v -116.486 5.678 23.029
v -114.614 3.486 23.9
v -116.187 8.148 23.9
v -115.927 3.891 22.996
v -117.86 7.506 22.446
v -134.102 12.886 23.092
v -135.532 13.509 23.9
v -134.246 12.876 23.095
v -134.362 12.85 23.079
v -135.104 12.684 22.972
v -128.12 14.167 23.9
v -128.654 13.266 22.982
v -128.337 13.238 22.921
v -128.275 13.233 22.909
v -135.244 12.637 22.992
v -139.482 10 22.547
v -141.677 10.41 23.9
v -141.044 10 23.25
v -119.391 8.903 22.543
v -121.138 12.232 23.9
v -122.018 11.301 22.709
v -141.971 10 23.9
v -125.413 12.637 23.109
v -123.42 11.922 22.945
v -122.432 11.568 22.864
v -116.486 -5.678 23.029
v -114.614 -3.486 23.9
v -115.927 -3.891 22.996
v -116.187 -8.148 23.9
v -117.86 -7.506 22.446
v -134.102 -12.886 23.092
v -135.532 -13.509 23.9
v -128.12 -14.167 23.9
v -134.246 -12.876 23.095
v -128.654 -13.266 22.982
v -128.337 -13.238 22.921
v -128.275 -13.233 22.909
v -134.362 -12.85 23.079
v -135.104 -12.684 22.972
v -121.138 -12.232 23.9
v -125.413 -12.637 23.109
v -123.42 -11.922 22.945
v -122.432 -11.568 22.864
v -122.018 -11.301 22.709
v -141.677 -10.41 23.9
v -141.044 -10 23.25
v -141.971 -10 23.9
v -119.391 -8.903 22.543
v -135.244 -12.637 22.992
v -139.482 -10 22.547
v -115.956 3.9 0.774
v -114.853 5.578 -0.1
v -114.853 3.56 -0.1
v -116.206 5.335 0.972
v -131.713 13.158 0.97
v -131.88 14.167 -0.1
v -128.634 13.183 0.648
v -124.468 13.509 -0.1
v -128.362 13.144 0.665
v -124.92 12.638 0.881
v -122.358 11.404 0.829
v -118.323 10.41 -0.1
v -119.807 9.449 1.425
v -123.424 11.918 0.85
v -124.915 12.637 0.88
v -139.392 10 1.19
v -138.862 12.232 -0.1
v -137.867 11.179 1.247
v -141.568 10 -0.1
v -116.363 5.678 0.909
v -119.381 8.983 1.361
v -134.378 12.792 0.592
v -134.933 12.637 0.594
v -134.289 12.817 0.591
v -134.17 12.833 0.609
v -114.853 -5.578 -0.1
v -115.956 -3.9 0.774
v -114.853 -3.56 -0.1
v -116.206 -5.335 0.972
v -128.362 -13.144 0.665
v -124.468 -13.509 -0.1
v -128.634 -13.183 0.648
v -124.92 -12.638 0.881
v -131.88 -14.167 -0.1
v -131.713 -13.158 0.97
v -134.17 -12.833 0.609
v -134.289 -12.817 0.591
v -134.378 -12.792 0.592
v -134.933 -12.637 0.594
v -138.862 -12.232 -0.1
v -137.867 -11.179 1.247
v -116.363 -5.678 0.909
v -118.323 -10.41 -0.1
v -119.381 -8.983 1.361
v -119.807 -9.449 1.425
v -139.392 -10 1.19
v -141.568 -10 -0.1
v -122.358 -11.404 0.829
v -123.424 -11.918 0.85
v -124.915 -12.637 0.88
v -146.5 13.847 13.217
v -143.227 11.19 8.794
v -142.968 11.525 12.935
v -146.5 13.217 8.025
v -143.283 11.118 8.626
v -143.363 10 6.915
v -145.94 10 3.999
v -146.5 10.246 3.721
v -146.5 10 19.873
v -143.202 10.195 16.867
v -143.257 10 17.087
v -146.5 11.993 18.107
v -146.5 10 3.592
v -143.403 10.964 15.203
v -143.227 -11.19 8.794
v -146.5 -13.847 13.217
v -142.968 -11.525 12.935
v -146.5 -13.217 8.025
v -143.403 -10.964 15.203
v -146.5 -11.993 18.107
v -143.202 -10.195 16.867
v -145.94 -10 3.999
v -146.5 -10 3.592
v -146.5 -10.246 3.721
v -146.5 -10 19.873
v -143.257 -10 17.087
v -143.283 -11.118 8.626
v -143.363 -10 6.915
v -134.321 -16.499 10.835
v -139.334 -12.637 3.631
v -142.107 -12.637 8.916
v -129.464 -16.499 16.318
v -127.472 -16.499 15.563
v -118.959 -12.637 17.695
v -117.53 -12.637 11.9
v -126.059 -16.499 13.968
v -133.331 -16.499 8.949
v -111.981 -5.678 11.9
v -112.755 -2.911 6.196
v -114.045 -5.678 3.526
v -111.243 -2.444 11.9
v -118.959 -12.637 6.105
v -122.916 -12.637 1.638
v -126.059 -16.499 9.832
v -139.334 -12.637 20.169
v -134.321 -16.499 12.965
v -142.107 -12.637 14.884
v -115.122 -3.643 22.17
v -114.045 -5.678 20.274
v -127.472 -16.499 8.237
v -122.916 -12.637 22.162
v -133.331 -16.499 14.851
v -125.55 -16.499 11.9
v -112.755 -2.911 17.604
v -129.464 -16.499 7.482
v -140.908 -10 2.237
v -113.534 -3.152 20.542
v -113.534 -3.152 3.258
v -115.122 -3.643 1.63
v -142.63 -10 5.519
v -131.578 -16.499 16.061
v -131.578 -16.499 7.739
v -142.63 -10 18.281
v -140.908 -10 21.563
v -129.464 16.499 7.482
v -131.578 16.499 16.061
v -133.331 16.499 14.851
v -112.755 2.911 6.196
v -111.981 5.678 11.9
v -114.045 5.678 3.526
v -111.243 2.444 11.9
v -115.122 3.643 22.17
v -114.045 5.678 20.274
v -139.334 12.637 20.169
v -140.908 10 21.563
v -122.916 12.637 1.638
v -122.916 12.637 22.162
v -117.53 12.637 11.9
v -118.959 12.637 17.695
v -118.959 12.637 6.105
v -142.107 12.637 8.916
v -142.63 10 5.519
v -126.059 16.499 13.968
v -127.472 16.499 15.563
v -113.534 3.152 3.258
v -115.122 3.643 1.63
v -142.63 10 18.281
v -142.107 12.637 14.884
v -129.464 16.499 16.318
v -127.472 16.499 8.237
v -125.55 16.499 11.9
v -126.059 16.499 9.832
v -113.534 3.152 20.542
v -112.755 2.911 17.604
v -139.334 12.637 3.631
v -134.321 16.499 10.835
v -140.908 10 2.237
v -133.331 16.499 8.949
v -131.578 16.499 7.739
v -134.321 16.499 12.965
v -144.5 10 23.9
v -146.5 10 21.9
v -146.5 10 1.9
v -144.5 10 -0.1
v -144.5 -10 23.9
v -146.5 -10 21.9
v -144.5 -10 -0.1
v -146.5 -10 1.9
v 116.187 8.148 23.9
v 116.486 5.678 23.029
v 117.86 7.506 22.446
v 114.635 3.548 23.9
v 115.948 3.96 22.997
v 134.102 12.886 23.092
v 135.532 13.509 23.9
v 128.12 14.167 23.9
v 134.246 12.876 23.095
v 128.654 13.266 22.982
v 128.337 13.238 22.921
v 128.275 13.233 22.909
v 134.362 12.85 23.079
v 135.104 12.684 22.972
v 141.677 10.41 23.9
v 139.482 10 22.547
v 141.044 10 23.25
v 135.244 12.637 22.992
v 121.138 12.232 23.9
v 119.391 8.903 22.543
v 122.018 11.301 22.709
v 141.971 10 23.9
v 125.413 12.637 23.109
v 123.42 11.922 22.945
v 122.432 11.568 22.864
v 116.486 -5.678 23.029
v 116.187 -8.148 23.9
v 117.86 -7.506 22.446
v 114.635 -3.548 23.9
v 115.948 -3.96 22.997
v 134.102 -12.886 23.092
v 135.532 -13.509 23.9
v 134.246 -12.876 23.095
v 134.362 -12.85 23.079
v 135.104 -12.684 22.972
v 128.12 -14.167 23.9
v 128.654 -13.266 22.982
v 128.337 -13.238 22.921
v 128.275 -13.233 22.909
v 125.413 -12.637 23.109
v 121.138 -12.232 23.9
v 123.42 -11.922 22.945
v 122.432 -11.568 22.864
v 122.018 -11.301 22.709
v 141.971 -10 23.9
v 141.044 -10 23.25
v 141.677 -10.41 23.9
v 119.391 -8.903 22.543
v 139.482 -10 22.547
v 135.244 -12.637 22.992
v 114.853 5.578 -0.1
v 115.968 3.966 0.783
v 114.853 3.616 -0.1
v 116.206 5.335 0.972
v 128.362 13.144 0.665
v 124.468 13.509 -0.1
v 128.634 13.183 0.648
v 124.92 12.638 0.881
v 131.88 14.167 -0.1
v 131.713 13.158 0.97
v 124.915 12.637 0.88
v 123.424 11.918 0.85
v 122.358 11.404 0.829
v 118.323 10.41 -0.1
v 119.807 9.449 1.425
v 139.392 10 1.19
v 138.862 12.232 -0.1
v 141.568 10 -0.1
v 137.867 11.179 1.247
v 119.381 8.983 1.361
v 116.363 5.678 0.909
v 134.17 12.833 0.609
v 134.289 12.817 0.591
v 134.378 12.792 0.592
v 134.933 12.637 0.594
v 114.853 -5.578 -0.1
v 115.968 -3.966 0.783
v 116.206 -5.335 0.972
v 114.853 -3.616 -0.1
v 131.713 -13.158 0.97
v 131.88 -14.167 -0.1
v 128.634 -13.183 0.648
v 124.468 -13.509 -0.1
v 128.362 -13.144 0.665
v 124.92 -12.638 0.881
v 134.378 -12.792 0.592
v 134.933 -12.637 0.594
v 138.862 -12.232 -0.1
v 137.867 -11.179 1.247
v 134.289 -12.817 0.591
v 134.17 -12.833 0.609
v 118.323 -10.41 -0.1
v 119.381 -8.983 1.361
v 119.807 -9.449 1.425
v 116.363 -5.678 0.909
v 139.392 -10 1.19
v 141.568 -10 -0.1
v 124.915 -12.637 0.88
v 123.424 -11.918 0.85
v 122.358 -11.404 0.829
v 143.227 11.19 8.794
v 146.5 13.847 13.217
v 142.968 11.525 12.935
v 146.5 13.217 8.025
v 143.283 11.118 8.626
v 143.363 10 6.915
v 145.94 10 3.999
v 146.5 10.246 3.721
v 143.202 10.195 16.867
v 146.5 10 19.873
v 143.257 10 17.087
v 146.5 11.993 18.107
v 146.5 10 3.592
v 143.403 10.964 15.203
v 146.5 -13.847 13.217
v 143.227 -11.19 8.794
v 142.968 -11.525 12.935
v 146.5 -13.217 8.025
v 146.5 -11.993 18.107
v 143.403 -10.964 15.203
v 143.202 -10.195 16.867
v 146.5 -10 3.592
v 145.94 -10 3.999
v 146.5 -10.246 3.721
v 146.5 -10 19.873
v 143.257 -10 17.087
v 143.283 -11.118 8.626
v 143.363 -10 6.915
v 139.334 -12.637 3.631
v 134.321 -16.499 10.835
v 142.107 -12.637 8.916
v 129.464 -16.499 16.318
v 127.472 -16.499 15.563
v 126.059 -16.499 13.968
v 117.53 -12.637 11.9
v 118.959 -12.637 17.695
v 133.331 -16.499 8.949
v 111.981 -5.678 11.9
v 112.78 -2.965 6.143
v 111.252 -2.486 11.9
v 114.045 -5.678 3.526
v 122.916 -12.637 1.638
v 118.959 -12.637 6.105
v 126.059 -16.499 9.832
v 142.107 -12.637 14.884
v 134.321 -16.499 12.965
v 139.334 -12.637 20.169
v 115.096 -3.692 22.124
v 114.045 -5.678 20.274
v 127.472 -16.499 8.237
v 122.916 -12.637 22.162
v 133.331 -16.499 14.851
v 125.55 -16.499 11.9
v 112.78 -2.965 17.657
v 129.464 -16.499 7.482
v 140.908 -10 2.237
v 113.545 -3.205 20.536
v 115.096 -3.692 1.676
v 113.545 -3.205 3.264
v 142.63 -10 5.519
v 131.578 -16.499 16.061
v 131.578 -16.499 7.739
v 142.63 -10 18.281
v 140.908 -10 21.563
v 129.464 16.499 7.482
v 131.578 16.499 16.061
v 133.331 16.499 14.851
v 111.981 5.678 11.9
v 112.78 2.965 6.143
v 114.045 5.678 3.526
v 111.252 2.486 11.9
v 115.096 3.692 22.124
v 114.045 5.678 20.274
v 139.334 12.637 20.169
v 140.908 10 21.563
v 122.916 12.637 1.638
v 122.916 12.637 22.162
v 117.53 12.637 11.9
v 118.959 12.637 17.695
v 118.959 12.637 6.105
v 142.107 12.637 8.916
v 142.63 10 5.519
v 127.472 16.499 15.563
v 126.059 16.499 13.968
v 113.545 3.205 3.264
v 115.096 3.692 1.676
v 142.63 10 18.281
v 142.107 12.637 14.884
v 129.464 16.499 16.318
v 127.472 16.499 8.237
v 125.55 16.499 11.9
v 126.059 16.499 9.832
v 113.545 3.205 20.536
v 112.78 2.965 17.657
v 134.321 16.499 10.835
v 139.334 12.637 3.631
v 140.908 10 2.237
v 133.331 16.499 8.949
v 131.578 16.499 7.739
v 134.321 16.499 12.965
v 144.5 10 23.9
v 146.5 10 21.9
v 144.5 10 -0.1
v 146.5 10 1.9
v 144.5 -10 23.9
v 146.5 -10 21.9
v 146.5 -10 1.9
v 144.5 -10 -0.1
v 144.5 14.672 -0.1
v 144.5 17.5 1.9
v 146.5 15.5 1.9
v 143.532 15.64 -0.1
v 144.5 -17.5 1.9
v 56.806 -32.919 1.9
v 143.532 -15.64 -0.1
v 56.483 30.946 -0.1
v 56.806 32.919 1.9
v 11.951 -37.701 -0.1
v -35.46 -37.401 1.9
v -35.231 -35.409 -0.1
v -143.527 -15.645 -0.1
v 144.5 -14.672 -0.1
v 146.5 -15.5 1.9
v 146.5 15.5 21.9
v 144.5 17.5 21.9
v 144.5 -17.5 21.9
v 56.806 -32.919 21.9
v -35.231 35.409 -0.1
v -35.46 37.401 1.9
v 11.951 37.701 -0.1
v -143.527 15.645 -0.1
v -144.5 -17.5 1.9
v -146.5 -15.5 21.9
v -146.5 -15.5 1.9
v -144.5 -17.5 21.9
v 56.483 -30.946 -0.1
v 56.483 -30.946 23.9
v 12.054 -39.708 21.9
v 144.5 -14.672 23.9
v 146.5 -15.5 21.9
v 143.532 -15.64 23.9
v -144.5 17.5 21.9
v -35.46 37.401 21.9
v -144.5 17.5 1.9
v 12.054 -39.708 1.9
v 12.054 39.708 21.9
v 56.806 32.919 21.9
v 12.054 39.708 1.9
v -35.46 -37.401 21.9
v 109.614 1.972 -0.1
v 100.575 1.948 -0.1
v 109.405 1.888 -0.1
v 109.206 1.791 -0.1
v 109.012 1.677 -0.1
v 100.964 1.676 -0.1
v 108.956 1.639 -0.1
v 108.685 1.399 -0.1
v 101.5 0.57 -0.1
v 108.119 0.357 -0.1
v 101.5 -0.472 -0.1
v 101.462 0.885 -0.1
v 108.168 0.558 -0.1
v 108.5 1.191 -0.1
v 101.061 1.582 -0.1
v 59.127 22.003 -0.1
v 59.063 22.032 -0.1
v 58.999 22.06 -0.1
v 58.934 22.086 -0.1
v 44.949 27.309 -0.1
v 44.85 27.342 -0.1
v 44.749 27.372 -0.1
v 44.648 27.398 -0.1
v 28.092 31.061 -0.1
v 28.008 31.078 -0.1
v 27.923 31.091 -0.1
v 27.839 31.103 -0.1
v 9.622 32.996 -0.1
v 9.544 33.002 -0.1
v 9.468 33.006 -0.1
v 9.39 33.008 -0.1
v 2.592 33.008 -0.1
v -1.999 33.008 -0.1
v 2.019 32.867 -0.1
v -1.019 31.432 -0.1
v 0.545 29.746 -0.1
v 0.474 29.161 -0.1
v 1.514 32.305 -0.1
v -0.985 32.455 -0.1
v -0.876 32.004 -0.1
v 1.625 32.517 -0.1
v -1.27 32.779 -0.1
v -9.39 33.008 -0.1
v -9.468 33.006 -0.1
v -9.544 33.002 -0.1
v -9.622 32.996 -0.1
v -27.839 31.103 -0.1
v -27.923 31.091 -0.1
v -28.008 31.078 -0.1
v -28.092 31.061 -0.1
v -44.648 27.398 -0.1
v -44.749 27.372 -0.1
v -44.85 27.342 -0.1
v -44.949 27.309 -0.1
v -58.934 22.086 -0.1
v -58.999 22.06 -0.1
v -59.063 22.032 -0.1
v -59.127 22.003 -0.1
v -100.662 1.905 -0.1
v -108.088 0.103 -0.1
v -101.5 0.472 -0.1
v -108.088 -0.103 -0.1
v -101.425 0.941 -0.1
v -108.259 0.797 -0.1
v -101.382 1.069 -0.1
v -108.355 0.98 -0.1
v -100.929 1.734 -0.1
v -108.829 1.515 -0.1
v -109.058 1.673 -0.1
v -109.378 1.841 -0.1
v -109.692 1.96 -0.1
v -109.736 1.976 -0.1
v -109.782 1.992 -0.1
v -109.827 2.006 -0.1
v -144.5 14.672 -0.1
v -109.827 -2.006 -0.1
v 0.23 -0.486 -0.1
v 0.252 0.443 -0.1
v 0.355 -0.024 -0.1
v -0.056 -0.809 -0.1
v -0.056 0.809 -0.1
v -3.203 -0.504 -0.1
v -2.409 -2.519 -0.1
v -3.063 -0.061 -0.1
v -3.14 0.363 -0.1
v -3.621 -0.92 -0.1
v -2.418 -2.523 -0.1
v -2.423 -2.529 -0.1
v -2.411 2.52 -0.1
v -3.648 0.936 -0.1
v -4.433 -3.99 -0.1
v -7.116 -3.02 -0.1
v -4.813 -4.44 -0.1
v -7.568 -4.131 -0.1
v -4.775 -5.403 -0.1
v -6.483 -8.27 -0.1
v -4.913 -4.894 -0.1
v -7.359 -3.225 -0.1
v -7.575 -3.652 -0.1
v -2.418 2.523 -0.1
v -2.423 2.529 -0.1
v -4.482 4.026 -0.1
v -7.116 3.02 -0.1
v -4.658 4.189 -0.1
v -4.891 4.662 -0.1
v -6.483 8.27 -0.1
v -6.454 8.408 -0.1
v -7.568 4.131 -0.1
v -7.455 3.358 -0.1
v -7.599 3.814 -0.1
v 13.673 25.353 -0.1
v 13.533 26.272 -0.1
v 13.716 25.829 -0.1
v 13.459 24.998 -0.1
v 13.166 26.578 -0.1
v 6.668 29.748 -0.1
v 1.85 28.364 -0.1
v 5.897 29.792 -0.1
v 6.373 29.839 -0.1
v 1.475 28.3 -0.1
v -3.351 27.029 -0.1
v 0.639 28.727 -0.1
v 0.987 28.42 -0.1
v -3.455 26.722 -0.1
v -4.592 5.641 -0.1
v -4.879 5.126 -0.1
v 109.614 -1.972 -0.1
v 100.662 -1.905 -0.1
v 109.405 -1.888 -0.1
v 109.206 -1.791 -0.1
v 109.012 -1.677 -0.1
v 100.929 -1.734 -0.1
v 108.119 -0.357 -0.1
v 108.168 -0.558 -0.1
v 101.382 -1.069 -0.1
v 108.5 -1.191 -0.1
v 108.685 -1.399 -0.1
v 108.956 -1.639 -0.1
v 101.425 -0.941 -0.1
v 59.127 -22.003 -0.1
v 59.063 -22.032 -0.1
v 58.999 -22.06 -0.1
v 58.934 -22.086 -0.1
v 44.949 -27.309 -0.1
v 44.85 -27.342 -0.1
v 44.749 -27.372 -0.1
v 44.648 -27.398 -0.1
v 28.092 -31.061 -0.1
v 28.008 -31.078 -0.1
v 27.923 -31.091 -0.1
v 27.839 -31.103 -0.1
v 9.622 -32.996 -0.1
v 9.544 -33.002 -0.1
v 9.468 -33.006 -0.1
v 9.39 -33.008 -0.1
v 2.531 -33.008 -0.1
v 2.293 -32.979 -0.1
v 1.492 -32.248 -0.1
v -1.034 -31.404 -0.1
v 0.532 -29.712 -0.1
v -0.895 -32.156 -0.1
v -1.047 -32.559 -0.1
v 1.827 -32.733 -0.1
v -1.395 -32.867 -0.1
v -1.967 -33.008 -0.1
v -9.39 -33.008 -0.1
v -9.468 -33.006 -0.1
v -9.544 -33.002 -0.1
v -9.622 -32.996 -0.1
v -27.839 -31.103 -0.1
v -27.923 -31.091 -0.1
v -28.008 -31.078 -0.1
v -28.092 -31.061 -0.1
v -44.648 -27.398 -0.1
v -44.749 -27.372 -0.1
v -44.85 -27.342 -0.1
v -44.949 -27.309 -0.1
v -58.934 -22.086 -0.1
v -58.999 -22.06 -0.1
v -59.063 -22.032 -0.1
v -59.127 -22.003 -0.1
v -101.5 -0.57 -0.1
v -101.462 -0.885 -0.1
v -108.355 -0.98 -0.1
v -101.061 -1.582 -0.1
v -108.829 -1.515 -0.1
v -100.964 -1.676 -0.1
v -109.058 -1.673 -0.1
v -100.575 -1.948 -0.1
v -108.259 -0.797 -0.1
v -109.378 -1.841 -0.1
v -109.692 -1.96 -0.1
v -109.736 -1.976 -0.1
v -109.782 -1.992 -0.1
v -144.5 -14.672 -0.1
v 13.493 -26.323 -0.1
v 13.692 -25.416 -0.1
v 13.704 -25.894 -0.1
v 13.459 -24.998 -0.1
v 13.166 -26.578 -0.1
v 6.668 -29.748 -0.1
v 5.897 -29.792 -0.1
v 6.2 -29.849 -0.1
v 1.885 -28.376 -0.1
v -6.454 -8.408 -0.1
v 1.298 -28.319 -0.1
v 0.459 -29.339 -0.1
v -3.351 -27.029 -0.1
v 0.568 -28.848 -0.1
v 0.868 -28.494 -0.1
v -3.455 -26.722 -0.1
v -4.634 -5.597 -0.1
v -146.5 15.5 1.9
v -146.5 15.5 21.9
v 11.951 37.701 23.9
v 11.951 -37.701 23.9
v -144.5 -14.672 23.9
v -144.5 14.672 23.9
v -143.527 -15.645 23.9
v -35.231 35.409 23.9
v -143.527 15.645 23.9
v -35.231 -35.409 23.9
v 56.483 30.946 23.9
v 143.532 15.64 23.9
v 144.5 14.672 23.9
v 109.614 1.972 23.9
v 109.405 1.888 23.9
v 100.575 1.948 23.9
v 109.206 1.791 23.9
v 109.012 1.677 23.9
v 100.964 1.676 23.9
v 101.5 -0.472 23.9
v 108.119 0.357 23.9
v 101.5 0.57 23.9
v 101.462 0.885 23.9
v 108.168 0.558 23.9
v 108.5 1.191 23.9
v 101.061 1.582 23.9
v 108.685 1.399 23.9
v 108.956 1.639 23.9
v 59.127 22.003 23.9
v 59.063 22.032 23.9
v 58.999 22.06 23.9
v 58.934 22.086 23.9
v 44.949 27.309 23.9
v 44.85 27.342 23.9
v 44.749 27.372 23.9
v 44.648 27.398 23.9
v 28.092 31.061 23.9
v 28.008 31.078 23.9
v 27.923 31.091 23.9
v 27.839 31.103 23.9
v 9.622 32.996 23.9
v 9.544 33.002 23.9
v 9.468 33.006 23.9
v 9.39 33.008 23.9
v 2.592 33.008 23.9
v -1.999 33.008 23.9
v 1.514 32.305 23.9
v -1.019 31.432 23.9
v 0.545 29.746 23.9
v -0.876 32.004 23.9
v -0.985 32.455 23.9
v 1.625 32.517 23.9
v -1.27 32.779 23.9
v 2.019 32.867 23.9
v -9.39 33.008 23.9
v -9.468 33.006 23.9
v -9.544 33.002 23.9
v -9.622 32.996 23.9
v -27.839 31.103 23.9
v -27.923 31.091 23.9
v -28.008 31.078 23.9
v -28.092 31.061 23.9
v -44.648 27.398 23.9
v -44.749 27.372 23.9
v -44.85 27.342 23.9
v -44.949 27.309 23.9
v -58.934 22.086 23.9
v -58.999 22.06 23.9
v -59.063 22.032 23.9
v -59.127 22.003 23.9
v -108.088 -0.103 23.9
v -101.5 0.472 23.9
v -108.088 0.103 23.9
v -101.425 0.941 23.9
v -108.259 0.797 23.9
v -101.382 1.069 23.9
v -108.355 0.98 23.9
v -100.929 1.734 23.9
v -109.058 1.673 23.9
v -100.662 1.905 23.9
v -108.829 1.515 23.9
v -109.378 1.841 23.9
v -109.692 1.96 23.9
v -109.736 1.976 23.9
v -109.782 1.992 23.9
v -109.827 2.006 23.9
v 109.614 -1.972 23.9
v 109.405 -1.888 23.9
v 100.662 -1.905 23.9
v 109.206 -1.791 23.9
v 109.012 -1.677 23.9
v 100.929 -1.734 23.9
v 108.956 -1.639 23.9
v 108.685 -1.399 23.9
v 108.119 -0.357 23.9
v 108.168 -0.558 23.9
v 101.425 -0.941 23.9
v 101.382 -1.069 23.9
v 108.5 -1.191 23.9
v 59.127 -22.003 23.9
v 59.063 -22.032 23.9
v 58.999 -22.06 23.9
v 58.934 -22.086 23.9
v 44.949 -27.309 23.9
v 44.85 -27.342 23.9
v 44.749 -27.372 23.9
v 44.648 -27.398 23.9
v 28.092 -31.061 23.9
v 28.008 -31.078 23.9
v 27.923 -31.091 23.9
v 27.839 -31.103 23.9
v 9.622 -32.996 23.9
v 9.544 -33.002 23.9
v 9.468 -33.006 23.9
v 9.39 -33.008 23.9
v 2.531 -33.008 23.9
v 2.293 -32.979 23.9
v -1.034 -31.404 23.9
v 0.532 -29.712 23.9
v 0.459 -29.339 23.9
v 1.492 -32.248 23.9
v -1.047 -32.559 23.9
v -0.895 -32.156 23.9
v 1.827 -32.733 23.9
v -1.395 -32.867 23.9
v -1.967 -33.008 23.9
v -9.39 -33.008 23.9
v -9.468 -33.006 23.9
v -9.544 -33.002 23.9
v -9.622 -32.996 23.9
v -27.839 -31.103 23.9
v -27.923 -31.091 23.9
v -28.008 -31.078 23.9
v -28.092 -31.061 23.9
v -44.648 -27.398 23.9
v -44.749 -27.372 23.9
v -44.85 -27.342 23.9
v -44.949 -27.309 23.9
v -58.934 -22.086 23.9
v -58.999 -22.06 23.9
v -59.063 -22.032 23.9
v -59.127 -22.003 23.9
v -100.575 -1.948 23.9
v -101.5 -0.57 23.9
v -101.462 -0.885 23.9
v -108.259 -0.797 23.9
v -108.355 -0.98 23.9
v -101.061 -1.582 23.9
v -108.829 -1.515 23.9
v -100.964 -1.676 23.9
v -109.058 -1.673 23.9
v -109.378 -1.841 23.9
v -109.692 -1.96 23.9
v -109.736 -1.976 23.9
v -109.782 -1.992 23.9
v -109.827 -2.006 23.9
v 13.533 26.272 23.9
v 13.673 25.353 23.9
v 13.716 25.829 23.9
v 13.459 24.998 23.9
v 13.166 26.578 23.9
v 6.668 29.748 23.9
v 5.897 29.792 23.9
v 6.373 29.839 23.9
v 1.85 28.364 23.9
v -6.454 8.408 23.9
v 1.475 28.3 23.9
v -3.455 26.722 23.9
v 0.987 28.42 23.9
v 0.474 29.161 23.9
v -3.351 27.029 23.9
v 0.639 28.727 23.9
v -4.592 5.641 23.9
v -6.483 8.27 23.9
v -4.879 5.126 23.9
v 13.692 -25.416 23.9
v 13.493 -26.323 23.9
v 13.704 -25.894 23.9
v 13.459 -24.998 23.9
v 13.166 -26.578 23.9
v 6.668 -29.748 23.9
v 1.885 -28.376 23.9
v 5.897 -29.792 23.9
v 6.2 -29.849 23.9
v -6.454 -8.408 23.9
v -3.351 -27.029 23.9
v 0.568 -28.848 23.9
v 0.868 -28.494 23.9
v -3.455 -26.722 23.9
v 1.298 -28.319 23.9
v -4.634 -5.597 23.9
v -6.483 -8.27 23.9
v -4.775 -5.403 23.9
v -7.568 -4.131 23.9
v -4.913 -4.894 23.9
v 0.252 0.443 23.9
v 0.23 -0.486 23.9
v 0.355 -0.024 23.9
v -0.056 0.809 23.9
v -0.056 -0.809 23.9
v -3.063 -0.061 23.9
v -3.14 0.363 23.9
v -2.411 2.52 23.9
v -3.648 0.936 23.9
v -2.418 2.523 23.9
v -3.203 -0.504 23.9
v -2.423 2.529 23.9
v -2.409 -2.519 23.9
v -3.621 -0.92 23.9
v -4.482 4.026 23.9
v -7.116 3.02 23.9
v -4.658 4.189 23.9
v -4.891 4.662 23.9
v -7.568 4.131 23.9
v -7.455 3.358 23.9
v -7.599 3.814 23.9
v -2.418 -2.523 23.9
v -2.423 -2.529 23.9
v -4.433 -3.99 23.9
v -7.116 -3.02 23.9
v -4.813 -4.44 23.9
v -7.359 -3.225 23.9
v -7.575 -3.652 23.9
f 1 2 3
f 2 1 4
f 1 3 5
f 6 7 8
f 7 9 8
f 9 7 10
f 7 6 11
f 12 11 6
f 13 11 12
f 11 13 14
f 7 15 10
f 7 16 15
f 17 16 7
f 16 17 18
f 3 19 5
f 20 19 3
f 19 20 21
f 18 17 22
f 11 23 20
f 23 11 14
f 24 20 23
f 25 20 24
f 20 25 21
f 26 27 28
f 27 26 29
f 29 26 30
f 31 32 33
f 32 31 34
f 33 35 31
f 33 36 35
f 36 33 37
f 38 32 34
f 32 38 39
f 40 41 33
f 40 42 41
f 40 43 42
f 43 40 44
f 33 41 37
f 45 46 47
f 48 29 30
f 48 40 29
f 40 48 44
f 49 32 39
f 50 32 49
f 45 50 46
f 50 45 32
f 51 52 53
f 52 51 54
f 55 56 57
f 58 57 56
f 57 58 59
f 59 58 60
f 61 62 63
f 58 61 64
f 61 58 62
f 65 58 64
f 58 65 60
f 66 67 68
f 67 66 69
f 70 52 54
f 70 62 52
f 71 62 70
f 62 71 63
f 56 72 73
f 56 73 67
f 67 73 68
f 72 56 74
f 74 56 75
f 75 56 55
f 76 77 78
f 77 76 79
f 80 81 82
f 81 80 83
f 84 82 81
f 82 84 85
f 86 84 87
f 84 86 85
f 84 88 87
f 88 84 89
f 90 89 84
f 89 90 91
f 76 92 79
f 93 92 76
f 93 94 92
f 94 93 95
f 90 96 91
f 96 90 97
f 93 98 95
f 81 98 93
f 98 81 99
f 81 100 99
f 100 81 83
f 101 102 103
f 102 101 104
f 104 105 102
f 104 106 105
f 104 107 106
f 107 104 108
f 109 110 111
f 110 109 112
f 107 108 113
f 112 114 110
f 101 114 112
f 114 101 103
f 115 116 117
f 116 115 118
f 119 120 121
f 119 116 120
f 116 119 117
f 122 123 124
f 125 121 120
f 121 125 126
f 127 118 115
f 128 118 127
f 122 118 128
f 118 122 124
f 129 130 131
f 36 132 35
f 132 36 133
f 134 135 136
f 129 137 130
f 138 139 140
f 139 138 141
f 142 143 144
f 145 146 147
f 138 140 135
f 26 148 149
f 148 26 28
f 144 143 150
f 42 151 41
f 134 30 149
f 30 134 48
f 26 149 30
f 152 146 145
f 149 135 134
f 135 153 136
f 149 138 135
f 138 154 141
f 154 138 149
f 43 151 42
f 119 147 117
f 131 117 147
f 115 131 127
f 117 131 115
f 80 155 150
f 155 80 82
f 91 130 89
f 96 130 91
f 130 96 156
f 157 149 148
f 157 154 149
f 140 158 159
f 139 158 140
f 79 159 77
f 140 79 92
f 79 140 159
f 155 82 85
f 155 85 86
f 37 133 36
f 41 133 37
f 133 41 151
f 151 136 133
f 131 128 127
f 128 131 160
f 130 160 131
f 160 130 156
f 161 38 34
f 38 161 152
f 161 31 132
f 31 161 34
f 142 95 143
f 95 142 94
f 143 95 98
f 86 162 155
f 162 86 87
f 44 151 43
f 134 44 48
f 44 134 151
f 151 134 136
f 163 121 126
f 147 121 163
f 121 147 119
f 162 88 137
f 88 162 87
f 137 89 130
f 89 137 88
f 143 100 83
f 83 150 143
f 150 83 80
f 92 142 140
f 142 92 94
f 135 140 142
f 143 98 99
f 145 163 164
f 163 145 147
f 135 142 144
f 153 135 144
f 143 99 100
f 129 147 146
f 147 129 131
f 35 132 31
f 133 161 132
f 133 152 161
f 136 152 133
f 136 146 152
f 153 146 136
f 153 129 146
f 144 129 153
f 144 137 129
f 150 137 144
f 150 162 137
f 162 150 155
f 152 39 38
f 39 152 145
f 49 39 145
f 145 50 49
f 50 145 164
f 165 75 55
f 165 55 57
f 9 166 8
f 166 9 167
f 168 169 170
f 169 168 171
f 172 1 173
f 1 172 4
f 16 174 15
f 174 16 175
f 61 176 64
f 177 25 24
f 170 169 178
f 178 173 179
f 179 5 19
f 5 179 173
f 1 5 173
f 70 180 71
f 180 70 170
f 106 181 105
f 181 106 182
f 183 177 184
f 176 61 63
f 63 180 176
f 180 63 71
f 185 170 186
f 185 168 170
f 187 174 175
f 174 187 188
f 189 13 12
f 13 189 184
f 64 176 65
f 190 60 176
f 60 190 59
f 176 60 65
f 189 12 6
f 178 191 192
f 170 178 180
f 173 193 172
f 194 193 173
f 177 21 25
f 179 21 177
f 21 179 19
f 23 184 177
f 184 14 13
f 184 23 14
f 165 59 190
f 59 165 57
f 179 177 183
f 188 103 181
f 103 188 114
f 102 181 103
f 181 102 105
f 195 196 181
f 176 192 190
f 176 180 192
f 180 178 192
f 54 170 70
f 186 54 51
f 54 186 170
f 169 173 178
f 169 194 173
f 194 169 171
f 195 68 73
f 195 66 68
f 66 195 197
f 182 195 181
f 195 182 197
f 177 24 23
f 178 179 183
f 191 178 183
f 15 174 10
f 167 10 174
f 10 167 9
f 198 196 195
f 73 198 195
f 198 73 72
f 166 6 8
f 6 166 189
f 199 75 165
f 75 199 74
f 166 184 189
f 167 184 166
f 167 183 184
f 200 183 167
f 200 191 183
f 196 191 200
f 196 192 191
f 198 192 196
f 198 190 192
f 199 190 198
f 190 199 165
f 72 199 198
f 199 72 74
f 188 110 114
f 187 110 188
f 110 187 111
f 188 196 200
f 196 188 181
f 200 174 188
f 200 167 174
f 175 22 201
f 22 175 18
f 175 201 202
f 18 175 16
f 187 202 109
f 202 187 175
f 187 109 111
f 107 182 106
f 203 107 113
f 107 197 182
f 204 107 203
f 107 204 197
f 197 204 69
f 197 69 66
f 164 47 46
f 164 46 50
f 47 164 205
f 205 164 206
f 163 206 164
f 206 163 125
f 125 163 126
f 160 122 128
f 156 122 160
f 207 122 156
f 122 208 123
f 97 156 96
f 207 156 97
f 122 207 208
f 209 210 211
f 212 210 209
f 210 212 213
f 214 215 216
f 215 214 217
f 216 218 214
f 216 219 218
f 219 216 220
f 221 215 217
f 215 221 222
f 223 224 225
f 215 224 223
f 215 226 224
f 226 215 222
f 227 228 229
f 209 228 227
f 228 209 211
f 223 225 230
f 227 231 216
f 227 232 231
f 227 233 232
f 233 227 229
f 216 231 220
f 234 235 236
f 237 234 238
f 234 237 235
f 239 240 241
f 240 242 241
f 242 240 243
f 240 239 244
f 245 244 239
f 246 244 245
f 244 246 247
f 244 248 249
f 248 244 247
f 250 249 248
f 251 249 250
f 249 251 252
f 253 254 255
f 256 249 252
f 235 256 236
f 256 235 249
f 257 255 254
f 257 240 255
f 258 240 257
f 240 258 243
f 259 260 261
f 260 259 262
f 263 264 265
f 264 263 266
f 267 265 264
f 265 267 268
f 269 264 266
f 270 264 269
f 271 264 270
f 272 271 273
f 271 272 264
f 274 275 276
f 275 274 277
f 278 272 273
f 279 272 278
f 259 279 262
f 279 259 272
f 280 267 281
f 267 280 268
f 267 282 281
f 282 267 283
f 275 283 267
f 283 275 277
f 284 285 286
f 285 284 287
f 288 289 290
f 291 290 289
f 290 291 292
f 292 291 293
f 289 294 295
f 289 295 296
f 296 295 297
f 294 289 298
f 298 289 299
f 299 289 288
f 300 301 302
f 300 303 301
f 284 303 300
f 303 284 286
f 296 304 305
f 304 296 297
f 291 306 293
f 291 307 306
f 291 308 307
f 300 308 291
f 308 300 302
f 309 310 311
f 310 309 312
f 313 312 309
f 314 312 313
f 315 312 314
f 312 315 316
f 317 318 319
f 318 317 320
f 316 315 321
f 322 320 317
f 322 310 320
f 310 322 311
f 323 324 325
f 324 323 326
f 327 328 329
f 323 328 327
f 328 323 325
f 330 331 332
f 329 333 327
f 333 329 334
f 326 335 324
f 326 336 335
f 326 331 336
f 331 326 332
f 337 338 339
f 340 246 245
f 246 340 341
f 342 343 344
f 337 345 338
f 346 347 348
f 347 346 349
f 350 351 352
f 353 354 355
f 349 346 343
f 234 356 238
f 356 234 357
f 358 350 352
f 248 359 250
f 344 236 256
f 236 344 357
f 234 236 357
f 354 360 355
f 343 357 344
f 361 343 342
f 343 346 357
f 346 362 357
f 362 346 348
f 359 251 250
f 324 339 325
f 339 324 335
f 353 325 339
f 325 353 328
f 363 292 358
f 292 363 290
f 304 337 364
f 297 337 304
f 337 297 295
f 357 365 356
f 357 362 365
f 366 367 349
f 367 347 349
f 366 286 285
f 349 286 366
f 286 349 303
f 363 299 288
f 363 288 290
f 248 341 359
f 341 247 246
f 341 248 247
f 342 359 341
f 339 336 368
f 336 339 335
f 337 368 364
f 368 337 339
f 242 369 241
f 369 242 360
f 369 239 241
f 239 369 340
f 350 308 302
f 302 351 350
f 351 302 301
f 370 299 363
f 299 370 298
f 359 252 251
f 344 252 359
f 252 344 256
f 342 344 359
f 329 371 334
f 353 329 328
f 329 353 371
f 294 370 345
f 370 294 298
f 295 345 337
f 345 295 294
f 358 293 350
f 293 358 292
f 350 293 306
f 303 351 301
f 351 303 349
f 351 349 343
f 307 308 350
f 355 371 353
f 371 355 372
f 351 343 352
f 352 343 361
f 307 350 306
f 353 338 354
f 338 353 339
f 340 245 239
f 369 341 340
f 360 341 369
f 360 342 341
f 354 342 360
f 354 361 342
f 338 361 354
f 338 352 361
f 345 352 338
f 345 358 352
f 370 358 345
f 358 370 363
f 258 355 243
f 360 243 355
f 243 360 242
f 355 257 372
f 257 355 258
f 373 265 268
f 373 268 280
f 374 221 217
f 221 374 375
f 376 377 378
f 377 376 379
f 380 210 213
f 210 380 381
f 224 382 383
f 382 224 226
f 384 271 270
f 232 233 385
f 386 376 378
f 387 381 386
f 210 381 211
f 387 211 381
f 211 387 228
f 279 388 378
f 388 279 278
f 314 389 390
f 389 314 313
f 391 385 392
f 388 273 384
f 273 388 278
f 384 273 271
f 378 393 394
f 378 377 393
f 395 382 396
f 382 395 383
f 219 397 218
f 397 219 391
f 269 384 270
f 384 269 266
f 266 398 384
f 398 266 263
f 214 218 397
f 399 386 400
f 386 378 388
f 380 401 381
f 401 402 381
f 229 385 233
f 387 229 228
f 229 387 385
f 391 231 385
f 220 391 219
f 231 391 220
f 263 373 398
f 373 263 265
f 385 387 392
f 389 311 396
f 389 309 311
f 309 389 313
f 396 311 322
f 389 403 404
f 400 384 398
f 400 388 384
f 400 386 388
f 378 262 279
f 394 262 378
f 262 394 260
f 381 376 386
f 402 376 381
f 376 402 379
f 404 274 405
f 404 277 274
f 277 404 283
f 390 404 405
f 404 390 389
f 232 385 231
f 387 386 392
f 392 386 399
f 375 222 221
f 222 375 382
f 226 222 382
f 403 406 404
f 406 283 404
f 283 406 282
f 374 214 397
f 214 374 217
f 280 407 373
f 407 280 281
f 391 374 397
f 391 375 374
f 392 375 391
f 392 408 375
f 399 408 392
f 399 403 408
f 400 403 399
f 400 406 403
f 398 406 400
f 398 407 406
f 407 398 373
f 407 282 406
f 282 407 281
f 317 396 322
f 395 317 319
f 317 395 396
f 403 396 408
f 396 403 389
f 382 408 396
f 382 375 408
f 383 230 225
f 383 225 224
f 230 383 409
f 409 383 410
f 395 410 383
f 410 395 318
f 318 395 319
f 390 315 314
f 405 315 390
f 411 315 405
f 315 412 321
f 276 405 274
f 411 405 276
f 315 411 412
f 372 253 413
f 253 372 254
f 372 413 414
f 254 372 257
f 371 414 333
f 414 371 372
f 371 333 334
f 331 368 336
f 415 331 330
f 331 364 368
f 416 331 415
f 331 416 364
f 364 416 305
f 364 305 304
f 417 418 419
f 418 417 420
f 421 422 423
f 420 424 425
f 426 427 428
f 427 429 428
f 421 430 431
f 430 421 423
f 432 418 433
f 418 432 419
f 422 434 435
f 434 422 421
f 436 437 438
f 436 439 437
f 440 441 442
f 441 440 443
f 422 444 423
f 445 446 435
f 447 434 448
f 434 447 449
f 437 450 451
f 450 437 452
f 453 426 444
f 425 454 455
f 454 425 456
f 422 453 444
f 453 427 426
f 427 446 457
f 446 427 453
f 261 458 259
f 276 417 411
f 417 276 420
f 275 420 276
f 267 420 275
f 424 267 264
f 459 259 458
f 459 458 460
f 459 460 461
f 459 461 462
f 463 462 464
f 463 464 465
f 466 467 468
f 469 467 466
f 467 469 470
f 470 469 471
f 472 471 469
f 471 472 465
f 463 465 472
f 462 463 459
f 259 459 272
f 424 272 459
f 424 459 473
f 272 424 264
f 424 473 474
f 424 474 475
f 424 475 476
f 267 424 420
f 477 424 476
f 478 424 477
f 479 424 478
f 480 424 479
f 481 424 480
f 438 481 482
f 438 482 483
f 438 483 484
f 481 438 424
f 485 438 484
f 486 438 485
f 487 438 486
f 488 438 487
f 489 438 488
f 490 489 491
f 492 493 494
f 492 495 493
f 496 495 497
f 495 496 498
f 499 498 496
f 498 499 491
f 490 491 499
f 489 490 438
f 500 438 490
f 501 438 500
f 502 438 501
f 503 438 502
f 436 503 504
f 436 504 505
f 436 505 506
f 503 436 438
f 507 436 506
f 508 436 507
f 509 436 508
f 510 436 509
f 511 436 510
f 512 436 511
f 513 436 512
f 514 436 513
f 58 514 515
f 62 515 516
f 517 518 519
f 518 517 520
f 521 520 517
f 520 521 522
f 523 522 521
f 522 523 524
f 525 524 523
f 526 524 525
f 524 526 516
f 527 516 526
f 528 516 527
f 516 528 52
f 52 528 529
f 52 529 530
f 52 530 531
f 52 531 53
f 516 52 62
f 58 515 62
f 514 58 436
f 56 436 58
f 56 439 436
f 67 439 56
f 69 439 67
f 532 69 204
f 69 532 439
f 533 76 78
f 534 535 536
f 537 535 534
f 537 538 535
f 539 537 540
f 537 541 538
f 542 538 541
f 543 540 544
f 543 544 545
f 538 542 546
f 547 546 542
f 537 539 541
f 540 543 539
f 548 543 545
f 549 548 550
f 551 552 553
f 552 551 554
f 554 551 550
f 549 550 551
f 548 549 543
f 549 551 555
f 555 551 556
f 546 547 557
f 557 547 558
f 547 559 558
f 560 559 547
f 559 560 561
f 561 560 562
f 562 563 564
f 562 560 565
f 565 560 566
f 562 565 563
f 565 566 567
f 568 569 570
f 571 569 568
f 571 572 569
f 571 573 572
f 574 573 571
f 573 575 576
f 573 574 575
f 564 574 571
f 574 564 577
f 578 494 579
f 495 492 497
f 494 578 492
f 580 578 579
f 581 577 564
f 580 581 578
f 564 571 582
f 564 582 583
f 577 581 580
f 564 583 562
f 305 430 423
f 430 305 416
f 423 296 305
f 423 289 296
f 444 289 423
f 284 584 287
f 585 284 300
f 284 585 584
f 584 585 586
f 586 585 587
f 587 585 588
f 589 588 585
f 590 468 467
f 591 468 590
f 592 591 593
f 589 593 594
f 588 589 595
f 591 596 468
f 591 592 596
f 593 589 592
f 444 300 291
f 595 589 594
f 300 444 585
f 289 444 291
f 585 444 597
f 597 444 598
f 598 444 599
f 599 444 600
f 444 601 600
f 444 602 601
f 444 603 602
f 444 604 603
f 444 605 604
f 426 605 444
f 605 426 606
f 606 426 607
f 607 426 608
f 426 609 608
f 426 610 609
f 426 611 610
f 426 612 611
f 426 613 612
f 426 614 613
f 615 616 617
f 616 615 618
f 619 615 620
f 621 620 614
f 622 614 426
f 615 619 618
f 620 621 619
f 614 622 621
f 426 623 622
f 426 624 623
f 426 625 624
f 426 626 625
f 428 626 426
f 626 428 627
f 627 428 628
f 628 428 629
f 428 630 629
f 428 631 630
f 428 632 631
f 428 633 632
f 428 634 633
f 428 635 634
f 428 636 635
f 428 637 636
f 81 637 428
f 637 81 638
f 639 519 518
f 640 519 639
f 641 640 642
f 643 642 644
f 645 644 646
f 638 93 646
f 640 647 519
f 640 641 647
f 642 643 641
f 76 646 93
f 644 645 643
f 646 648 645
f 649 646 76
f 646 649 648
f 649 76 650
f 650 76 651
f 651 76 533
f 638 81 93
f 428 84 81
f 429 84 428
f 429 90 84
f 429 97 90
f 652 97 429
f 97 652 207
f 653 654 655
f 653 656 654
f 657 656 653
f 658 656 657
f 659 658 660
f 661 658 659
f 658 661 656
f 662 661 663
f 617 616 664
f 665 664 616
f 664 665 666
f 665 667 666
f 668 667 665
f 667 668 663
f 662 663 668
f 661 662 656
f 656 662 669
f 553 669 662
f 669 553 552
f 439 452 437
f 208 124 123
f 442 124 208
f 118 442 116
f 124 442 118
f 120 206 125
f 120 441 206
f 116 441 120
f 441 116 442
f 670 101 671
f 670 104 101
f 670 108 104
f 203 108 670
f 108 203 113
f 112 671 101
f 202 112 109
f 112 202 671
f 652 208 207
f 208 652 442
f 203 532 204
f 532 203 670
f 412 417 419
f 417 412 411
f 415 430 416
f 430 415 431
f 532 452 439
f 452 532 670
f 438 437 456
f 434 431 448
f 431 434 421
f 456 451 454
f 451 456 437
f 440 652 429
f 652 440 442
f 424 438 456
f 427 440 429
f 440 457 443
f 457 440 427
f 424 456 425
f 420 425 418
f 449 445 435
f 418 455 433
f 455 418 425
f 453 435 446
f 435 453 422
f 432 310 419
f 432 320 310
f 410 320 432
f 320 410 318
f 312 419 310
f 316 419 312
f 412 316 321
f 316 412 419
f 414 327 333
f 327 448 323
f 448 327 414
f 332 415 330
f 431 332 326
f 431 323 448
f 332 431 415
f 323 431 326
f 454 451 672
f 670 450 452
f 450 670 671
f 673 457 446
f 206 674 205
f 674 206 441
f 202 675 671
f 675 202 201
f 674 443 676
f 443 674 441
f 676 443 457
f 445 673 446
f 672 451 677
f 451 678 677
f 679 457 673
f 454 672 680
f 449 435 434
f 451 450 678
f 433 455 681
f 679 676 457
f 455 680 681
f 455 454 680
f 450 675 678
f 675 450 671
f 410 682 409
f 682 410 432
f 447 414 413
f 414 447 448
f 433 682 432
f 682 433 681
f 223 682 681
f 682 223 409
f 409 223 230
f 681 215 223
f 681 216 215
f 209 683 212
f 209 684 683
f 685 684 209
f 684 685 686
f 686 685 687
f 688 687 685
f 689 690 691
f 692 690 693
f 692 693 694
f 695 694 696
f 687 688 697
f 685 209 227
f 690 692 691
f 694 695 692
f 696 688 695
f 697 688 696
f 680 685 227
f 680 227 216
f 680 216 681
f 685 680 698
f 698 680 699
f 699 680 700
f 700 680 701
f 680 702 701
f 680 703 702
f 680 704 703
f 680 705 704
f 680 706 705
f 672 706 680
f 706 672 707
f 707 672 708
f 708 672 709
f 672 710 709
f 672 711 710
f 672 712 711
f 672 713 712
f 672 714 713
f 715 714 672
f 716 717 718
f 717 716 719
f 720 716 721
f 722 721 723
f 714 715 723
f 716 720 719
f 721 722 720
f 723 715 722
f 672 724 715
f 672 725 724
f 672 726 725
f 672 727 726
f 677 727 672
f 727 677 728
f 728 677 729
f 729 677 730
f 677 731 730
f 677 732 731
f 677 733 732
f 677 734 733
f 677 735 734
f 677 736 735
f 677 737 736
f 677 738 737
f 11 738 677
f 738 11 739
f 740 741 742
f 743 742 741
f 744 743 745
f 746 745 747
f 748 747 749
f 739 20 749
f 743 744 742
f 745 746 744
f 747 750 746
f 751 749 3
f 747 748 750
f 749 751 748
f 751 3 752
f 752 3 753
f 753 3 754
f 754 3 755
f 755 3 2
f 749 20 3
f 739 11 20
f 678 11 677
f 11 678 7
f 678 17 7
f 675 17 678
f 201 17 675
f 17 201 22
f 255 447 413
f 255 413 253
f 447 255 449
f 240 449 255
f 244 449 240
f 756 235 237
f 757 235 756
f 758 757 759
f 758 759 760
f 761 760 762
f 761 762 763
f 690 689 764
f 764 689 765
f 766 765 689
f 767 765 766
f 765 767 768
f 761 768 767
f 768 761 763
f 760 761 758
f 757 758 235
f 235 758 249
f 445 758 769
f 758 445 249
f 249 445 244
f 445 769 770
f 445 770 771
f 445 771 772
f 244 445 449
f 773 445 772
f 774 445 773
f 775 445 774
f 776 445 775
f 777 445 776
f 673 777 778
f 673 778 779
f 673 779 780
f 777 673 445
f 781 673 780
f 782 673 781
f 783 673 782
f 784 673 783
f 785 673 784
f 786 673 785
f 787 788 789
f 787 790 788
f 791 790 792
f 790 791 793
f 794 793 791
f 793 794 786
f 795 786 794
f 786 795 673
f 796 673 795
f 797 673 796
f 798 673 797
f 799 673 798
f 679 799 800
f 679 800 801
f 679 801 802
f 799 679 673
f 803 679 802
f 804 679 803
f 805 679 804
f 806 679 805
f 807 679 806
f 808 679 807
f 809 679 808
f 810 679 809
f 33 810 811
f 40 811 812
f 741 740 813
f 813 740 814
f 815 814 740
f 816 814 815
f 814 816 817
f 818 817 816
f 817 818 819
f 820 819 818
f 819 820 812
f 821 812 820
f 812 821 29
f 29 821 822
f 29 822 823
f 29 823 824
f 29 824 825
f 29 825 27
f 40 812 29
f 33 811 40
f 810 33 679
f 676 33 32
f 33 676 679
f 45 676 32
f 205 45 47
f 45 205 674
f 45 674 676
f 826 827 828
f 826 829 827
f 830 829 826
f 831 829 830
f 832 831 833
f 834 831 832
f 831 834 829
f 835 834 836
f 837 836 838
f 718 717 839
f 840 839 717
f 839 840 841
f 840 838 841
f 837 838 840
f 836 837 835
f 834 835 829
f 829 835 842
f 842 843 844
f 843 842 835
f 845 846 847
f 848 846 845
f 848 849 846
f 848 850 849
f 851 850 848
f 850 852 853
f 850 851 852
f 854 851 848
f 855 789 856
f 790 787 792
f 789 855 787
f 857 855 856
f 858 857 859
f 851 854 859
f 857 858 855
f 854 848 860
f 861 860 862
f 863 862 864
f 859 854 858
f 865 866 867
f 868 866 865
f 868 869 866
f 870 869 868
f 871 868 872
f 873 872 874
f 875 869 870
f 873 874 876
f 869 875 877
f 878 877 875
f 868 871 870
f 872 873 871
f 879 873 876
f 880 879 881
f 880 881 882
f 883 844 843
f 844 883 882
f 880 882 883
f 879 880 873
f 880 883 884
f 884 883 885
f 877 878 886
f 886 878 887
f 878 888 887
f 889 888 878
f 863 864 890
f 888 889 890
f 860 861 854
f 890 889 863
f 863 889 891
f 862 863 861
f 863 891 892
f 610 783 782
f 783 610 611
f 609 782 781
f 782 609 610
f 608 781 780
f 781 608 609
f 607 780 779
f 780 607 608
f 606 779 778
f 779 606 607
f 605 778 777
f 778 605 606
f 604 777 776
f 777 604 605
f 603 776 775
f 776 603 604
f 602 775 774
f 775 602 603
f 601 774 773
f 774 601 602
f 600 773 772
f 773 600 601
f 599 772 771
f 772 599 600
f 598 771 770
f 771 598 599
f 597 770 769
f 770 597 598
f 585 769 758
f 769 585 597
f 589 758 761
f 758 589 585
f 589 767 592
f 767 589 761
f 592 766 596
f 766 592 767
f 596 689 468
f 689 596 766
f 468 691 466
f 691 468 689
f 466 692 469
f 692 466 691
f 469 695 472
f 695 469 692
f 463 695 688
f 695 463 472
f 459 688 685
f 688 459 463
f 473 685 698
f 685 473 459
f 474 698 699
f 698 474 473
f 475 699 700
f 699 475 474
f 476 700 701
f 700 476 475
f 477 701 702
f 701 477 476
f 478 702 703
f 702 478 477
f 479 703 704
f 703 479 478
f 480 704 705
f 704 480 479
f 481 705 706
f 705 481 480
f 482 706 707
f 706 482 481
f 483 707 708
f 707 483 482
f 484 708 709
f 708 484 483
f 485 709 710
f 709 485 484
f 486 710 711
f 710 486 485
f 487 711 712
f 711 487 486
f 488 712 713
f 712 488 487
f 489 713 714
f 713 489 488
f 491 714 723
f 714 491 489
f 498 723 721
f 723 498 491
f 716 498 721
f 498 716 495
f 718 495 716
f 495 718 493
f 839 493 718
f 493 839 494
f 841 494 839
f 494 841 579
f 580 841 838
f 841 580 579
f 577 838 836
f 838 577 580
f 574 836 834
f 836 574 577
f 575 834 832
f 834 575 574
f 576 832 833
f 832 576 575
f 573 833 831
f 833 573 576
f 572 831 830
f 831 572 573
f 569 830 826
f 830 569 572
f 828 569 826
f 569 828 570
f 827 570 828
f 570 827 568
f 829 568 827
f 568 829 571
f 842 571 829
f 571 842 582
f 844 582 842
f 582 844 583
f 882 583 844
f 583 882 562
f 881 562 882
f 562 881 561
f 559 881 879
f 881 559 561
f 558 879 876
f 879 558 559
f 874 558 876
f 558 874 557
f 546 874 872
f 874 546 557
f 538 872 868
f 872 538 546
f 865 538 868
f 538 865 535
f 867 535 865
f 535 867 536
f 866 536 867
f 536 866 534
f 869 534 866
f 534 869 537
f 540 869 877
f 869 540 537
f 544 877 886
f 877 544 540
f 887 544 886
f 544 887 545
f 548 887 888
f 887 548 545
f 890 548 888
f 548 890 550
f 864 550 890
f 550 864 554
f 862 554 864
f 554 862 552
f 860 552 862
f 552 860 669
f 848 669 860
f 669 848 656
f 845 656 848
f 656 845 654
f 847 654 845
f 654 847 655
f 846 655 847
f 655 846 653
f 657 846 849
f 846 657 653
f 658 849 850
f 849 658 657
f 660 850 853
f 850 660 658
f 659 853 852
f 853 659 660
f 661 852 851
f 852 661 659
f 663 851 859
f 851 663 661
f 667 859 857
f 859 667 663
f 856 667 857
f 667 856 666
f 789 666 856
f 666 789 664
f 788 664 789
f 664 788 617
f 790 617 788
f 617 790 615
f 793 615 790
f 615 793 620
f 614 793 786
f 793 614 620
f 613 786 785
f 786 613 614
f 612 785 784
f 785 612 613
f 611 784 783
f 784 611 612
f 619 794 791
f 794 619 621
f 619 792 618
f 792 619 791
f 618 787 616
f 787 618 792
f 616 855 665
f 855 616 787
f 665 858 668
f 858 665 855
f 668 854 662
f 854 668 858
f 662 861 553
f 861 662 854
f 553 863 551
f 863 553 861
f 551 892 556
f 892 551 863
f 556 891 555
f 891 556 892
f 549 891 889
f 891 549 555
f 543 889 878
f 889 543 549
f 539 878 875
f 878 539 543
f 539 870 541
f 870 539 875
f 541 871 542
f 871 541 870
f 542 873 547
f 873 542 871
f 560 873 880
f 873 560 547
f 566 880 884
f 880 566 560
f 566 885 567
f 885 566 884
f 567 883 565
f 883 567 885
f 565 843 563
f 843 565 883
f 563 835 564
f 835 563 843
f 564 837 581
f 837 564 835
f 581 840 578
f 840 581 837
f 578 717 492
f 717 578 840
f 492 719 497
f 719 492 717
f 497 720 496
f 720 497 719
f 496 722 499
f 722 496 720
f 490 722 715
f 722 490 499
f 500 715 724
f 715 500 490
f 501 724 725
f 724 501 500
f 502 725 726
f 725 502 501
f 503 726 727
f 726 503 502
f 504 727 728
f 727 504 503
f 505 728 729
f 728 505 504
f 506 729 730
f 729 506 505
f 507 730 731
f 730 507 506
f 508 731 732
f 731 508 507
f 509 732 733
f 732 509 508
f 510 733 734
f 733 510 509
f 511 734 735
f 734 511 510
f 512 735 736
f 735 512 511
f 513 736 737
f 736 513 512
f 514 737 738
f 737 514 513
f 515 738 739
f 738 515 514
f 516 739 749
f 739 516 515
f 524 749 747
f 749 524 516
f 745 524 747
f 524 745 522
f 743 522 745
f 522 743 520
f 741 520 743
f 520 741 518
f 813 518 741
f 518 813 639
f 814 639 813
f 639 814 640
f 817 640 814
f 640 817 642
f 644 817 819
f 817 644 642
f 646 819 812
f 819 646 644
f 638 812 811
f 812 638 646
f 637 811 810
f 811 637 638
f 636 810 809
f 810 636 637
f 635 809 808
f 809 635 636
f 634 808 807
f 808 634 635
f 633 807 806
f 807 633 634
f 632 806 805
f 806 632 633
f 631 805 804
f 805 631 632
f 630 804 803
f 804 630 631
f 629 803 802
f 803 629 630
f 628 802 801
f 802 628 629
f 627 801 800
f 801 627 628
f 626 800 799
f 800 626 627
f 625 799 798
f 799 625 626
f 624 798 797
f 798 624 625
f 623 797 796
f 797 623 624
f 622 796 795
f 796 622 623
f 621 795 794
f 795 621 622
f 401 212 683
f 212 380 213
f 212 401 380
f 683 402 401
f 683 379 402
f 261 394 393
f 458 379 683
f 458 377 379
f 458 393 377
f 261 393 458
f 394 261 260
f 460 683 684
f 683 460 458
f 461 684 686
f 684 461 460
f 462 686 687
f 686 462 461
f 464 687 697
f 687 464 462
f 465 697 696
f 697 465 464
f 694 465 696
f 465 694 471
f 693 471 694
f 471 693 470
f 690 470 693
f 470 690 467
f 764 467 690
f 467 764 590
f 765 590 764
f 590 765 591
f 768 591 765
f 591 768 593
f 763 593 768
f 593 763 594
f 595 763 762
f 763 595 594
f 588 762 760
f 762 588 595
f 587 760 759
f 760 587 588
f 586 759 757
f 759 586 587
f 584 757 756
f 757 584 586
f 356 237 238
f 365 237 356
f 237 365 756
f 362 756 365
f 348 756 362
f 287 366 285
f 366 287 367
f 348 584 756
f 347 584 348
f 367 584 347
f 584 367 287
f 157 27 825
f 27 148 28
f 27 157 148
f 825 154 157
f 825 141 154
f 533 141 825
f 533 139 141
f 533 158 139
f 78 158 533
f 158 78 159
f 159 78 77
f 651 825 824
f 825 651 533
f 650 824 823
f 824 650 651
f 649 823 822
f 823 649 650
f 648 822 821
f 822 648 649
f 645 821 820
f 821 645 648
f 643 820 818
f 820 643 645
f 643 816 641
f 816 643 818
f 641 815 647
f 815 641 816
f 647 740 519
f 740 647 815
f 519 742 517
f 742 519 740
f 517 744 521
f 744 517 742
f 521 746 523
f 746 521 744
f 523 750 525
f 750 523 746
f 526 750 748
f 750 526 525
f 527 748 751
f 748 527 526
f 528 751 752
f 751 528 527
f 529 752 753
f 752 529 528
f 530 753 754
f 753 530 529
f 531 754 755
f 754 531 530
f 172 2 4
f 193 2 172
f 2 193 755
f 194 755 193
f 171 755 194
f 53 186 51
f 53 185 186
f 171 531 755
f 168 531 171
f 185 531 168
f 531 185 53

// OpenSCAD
//$fn=30;
$fn=13;
L= 130;
M=L/150;
tab=8;
convexity =40;



scale (.5)intersection() {
   union() {
!translate([0,0, 11.9]) arm2();
*translate([0,0, 22])rotate( [0,180,0])halfbone();

//
translate([90,60,-00.1])bone();
translate([-90,60,-00.1])bone();
 
       
 translate([ 20,60,-00.1]) linear_extrude(20,convexity =40)   offset(0.5)   kross();
 translate([-20,60,-00.1]) linear_extrude(20,convexity =40)   offset(0.5)   kross();
       
}
 color("Red")translate([0,0,40]) cube([355,300,80],center=true);


}
echo(M);


module kross(){
    
     {
    translate ([0,5,0]) rotate(45)square([10,10],center=true);
   translate ([0,-5,0]) rotate(45)square([10,10],center=true);
    translate ([0,0,0]) rotate(0)square([7,7],center=true);

    }}

module arm() {
    hull(){c=2;
linear_extrude(24,center=true,convexity =40)offset(-c)grip(c);
linear_extrude(24-c*2,center=true,convexity =40)grip(c);
}



module grip(c){
hull(){
scale([2.5,1])circle(40);
square([L*2+33,35-c*2],center=true);
square([L*2+33-c*2,35],center=true);
}}
}
module block(){
    rotate(26) polygon([[2.125,4.95],[7,0],[16,0],
    [7.5,27.8],[16,29.3],[14,30.7],[6,30],[5,25],
    [-0.4,7],[-0,-5],[1.3,-4]])
    *square ([8,32]);
    }

module innard(){
   offset(-1,$fn=$fn)offset(2,$fn=$fn)offset(-1,$fn=$fn)
    difference(){
    
    union() {
    offset(-1,$fn=$fn)offset(2,$fn=$fn)offset(-1,$fn=$fn) union(){
union (){
     hull(){ square([L*2-65+tab,3],center=true);
  
scale([5.2*M,1.9])circle(17.5,$fn=$fn*2);
translate([-(L-35 ),0,0])circle(2,$fn=10);
translate([(L-35 ),0,0])circle(2,$fn=10);
}}






hull(){
translate([(L-20 ),0,0])circle(2);
translate([L,0,0])circle(8);
translate([(L+35*M),0,0])circle(5);}
hull(){
translate([-(L-20 ),0,0])circle(2);
translate([-L,0,0])circle(8);
translate([-(L+35*M),0,0])circle(5);}
}
}

//offset(.5,$fn=$fn) offset(-1.5,$fn=$fn)offset( 1,$fn=$fn) 
union(){
             translate([0,-33])block();
mirror([0,1])translate([0,-33])block();
 }

}
}
 




module arm2 (convexity =40){
 
 
 
 
 
difference(){
 arm();
 

 linear_extrude(100,center=true,convexity =40){ innard();} 

                  translate([-L,0,0])  shrinksphere();
 mirror([-1,0,0]) translate([-L,0,0])  shrinksphere();
 
} }

module  shrinksphere(){
    
    
  translate([-10,0,0])   cube([25,20.,26],center=true);
                  scale([1.3,0.95])    cones ();
 rotate([0,180,0])scale([1.3,0.95])  cones ();
scale([1.51,1])rotate([0,-90,0])cones ();
    
   intersection(){
translate([0,3,0]) rotate( [90, 0,0])  sphere(20);
translate([0,-3,0]) rotate( [90, 0,0]) sphere(20);
    }
    }
    
    module cones (){
        
         translate([0,3,0])   cylinder(12.5,0,12.5); 
 translate([0,-3,0])   cylinder(12.5,0,12.5);
        }

//

//translate([-L,0,0]) rotate( [0, -90,0]) cylinder(30 ,0,30);
// translate([-L,0,5]) rotate( [0, 0,0]) cylinder(30,0,30);
// translate([-L,0,-5]) rotate( [0, 180,0]) cylinder(30,0,30);
//intersection(){
//translate([L,5,0]) rotate( [90, 0,0]) sphere(20);
//
// //translate([ L,-4.1,0]) rotate( [0, 0,0])   phere(20);
//// translate([ L,4.1,0]) rotate( [0, 0,0])   phere(20);
//
//translate([L,-5,0]) rotate( [90, 0,0]) sphere(20);
//
//}
// translate([L,0,0]) rotate( [0, 90,0]) cylinder(30 ,0,30);
// translate([L,0,5]) rotate( [0, 0,0]) cylinder(30,0,30);
// translate([L,0,-5]) rotate( [0, 180,0]) cylinder(30,0,30);
// 
// 
//}

 
 
 
module phere(r)
{
j=2;
scale([1,1,1]) for(i=[0:5*j:180]){rotate( [0,i,0])  hull(){rotate_extrude(convexity =40)translate([r-j,0])circle(j,$fn=4);}}
 
}
module bone(){
    
    
    
    
    
    
    rotate([90,0,90])
    
 difference (){    
    {rotate_extrude(angle=180,convexity =40)
     intersection(){ 
translate([20,0,0])square([40,100],center=true);
 
offset(-20)offset(20)union(){translate([0,-30,0])circle(20);
square([10,30],center=true);
translate([0,30,0])circle(20);
}
}}

 translate([0,0,25])linear_extrude (30) offset(0.5)kross();
 mirror([0,0,1])translate([0,0,25])linear_extrude (30) offset(0.75)kross();
}



}

module halfbone(){rotate_extrude(convexity =40)intersection(){ 
translate([20,0,0])square([40,100],center=true);

offset(-19)offset(19)union(){translate([0,-30,0])circle(20);
square([10,40],center=true);
translate([0,20,0])square([50,5],center=true);
 }
}}

module CHcube(c,ch,cent)
{
    hull(){
        cube([c,c-ch,c-ch],center=true);
        cube([c-ch,c,c-ch],center=true);
        cube([c-ch,c-ch,c],center=true);
        
        }
    }
